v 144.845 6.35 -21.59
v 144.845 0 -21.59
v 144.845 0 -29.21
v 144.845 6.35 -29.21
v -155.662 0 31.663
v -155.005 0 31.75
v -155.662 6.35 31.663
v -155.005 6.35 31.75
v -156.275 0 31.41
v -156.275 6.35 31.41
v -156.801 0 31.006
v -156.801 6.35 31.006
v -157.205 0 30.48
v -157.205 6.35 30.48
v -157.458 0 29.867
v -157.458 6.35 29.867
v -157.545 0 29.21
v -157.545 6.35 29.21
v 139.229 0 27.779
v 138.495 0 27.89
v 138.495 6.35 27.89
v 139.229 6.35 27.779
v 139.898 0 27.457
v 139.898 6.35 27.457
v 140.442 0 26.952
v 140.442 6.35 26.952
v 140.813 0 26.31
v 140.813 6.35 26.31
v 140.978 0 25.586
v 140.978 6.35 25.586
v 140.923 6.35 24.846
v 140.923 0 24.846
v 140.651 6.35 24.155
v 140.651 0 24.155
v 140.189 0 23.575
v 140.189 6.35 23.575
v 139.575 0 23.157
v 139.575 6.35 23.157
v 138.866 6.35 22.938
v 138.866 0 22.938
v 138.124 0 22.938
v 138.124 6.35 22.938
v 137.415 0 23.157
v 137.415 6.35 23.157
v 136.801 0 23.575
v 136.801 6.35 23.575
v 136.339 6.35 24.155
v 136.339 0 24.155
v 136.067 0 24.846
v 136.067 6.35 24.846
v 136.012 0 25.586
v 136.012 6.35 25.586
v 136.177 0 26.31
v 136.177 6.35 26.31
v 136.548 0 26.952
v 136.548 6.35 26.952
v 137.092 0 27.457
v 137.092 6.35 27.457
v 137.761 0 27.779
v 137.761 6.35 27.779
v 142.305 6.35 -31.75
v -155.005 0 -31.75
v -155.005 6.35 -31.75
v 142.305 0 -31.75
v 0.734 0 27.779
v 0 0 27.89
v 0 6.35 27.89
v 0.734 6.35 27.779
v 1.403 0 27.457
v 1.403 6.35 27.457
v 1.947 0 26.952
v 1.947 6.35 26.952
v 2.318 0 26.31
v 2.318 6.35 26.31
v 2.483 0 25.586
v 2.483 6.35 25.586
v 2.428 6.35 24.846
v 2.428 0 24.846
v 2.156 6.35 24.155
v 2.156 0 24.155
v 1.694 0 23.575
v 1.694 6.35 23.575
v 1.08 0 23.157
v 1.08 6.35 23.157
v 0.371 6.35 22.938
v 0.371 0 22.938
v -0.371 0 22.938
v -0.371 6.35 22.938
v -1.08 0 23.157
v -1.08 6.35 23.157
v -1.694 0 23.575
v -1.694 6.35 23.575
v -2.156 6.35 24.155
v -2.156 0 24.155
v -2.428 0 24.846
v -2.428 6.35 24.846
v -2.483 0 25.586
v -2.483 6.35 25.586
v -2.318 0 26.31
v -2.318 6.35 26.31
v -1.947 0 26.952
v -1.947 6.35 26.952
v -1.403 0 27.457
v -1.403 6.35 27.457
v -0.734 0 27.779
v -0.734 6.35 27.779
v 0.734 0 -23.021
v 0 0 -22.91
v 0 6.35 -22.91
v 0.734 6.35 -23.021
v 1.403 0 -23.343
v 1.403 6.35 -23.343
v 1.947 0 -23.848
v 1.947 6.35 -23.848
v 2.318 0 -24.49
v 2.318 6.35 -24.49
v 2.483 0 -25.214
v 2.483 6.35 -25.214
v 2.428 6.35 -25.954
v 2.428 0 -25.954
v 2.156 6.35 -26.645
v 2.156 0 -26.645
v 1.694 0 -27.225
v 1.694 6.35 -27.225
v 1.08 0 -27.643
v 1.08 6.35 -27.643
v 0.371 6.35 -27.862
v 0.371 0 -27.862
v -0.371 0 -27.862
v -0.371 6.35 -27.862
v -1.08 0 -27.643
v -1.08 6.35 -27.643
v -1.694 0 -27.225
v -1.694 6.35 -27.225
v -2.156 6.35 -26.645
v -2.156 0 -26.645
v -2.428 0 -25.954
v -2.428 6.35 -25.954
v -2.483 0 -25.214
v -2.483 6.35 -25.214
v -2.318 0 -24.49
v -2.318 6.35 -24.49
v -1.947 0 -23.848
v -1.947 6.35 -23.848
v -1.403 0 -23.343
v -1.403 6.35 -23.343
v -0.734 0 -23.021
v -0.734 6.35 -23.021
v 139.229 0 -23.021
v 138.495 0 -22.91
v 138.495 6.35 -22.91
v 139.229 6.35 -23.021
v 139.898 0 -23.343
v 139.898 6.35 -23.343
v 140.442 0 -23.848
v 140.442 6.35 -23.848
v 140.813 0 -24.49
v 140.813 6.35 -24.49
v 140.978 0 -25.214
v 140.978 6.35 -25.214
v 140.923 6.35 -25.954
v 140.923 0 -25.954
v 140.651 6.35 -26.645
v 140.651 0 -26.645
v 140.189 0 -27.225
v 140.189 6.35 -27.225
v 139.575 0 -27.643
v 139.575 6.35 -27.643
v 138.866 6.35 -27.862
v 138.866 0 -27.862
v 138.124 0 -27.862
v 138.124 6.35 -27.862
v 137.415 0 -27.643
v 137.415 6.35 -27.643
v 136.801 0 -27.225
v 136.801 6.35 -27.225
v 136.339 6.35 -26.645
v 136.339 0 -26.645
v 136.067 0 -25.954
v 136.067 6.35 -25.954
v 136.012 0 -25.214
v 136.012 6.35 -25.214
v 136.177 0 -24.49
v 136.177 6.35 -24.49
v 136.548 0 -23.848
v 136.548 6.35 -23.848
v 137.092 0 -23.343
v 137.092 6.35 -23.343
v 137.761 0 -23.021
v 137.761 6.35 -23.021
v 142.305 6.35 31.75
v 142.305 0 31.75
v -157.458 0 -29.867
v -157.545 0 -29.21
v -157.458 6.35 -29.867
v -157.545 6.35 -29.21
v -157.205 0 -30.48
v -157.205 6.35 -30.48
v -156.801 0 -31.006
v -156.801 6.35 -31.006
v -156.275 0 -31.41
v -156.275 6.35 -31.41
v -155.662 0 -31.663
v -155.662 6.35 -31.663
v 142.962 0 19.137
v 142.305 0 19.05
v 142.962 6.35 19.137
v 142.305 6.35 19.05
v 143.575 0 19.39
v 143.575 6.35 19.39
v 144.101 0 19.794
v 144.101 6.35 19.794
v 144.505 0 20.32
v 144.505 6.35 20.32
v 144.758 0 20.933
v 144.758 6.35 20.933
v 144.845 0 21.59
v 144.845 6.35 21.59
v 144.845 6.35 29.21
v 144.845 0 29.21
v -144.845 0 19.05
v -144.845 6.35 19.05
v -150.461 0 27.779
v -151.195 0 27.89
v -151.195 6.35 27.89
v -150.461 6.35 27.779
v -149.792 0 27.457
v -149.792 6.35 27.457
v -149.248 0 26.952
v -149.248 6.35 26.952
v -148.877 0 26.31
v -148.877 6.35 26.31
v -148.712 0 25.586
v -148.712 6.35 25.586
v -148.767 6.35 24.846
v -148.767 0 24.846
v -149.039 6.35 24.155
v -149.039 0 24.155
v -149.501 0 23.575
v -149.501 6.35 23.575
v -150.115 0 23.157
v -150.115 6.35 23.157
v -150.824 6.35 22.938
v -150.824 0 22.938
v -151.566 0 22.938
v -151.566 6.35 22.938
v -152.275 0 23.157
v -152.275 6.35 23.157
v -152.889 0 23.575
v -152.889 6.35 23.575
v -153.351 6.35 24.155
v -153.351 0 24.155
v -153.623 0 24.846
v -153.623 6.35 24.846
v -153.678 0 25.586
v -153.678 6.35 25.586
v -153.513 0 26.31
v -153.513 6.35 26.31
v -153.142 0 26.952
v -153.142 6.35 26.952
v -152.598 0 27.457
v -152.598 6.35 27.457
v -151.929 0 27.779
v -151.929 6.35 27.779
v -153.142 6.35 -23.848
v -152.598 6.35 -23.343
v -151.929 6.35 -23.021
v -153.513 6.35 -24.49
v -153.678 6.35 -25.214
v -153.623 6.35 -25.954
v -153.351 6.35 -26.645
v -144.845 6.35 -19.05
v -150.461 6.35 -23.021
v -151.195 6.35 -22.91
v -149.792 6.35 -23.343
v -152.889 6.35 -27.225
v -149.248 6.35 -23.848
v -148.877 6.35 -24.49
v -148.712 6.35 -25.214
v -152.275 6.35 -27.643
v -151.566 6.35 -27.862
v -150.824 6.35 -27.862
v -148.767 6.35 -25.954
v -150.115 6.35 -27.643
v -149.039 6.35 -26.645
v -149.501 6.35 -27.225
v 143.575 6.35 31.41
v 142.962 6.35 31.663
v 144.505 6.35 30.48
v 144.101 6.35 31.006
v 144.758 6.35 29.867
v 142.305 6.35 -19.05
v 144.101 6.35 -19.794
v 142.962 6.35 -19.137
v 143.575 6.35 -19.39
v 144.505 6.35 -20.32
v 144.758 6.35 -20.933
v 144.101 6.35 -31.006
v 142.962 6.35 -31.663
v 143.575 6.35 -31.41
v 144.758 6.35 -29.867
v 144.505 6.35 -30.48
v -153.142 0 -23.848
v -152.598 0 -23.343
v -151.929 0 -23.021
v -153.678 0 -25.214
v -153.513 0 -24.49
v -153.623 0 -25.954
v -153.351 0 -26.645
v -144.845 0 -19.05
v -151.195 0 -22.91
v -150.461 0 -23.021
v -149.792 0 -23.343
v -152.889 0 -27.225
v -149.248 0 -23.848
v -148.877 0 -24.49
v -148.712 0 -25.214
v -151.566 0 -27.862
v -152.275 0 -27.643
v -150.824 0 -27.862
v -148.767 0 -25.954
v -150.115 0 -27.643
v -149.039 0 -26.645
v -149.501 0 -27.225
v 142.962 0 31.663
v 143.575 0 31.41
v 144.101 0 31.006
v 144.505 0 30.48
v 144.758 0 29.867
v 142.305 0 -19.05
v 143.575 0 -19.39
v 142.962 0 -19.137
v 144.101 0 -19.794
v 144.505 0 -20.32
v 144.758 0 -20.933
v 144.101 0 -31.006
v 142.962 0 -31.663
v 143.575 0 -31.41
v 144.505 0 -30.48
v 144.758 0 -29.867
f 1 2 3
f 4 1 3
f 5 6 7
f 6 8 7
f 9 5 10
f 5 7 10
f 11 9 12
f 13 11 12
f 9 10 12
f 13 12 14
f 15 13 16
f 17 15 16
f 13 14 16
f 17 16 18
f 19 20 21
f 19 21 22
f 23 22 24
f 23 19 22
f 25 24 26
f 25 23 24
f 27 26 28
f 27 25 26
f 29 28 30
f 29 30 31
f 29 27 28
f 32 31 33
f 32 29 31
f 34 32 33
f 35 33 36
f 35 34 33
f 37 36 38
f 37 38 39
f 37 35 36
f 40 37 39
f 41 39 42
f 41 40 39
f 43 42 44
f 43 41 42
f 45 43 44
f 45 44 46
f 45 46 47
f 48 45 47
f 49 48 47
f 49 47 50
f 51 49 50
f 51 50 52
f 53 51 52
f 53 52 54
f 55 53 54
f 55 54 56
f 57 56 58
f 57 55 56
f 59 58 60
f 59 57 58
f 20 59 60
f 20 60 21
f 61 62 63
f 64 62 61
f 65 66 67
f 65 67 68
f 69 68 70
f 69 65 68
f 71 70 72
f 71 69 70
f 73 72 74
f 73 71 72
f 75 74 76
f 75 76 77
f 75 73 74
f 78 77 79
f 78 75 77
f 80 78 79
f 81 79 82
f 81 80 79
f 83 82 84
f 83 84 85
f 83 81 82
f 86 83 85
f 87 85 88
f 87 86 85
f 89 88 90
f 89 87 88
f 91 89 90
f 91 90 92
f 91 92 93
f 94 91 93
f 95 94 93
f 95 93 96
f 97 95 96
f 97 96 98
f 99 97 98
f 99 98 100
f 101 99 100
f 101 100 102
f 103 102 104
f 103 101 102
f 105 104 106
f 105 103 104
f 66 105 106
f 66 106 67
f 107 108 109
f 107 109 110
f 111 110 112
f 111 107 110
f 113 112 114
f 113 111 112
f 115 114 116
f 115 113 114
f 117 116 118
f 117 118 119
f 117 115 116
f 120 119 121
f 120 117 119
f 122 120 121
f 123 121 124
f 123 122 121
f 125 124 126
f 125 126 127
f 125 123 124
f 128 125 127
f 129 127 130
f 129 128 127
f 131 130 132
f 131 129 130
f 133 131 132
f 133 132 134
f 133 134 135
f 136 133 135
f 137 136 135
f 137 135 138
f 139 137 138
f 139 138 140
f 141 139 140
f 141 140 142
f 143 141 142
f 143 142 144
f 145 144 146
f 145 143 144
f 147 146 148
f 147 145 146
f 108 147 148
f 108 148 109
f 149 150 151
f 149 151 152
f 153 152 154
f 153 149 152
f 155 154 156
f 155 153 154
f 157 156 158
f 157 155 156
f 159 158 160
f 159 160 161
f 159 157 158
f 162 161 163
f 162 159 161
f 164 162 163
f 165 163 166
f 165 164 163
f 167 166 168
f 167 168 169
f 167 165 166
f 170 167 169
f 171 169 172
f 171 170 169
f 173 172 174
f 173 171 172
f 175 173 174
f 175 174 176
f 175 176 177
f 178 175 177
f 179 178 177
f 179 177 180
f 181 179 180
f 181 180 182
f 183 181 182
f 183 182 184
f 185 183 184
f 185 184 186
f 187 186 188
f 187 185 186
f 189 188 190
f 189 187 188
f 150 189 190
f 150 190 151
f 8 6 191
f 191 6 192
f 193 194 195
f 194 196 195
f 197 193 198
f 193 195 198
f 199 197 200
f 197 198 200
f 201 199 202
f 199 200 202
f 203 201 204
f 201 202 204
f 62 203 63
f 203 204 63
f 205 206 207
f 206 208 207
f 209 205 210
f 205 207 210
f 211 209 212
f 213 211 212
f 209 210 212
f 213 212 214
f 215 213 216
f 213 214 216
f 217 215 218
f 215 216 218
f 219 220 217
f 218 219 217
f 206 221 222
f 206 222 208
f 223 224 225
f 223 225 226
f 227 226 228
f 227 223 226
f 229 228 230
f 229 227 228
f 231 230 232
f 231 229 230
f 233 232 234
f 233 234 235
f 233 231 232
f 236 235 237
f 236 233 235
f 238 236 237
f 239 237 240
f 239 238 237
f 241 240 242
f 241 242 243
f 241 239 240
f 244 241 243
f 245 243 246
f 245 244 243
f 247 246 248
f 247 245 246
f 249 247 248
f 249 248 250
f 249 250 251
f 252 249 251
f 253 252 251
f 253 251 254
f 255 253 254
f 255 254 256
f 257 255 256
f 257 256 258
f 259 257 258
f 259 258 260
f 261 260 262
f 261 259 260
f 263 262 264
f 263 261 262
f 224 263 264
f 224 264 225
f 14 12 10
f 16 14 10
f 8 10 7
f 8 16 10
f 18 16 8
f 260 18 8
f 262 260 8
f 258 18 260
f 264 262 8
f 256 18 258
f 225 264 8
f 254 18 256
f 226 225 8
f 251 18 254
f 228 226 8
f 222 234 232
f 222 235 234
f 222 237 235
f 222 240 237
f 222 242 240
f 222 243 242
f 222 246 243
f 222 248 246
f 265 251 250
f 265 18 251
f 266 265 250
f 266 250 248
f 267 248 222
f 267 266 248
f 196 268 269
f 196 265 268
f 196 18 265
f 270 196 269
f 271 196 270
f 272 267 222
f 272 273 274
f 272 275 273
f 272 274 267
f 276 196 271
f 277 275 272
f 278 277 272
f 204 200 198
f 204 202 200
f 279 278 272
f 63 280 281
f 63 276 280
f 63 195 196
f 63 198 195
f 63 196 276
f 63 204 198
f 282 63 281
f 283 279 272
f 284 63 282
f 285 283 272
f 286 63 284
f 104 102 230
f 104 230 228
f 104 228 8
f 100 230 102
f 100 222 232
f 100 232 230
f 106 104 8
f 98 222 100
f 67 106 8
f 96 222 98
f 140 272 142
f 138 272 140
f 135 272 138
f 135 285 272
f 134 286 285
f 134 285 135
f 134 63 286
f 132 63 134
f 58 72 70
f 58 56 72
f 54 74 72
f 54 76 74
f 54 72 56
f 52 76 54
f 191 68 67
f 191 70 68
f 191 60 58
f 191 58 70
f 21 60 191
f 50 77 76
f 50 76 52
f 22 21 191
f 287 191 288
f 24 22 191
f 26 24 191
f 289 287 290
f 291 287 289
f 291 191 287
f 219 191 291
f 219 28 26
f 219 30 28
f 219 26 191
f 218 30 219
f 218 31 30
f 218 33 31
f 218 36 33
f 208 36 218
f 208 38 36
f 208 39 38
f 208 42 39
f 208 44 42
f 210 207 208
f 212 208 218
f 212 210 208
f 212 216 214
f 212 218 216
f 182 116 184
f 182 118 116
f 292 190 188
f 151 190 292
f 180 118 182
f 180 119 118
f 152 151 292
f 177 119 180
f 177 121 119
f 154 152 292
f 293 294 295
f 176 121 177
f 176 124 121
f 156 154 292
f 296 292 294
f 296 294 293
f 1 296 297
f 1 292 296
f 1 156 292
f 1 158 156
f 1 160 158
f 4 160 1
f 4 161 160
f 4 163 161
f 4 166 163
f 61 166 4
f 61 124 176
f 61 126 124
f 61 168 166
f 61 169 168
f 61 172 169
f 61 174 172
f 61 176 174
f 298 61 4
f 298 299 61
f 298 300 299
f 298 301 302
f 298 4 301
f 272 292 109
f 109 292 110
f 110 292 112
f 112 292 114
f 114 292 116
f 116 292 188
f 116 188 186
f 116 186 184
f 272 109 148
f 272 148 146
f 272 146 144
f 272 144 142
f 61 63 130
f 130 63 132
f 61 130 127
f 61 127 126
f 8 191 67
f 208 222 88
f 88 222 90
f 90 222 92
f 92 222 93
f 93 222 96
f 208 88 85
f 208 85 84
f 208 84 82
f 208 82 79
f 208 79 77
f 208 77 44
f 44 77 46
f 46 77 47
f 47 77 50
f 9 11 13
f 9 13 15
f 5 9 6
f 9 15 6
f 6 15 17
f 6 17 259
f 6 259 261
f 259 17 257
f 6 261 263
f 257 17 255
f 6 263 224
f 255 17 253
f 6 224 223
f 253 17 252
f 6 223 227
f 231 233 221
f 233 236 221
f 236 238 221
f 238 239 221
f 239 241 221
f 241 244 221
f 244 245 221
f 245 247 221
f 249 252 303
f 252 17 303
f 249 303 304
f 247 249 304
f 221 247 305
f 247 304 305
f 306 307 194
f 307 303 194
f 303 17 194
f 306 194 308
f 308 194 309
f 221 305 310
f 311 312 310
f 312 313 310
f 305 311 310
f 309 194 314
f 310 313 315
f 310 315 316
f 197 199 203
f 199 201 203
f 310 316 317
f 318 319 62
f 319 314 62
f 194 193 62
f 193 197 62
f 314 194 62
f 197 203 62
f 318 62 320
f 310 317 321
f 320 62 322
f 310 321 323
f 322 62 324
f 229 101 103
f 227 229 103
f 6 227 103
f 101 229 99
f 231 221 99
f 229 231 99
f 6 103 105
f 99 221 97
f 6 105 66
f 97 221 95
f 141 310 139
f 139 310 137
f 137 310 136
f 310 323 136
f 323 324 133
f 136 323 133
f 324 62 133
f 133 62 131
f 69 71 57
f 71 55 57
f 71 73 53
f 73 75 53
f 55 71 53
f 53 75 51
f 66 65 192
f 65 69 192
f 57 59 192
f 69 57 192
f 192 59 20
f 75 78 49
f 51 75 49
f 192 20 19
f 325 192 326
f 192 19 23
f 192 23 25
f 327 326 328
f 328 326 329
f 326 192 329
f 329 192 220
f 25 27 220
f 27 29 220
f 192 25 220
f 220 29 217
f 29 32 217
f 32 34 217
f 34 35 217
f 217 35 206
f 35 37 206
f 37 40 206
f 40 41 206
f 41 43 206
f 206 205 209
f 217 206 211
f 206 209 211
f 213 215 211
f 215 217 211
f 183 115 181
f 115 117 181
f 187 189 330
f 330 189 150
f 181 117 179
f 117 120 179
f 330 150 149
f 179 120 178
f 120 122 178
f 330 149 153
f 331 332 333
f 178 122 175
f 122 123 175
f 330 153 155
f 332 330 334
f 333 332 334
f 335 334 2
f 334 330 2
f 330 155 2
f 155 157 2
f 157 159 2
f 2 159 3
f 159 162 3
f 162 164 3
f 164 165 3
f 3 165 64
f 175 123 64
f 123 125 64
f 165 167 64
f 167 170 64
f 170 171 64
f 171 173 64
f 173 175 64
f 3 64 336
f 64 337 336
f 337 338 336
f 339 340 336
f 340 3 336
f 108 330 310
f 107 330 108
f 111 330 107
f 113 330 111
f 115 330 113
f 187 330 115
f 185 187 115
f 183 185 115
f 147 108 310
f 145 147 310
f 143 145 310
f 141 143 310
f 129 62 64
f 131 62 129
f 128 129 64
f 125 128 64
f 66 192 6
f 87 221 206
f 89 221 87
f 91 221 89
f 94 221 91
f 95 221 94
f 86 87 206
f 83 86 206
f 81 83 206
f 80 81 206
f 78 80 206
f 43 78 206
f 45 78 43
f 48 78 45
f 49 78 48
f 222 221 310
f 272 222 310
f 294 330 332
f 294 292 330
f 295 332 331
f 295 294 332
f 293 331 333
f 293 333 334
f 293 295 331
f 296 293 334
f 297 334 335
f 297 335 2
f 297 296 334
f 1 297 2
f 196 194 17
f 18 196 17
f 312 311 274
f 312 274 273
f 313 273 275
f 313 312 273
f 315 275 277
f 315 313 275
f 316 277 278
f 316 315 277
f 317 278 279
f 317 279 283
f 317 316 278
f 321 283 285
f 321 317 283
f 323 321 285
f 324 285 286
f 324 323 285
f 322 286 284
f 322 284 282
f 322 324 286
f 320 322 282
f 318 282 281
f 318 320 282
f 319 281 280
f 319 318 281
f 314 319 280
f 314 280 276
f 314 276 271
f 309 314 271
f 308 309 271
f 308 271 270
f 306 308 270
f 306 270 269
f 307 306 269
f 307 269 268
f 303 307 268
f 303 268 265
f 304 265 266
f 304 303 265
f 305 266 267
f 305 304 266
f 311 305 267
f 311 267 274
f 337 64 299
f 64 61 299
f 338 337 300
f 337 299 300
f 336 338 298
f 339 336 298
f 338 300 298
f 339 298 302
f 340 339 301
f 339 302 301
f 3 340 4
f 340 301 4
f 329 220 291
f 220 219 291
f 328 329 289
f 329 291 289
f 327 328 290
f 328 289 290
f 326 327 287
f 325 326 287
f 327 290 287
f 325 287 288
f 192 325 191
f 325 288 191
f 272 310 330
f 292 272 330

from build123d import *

# Parameters (mm, degrees)
SKETCH1_W           = 289.69
SKETCH1_H           = 12.7
SKETCH1_R           = 2.49
BOSS_EXTRUDE1_DEPTH = 6.35
FILLET1_R           = 2.54


with BuildPart() as part:
    # Sketch1 → Boss-Extrude1 (new body)
    # profile 1 of 3: a face of its own
    with BuildSketch(Plane(origin=(0, 0, 0), x_dir=(1, 0, 0), z_dir=(0, 1, 0))):
        with Locations((0, -25.4)):
            Rectangle(SKETCH1_W, SKETCH1_H)
        with Locations(Location((138.495, -25.4, 0), (0, 0, 270))):
            Circle(SKETCH1_R, mode=Mode.SUBTRACT)
        with Locations(Location((0, -25.4, 0), (0, 0, 270))):
            Circle(SKETCH1_R, mode=Mode.SUBTRACT)
    # profile 2 of 3: a face of its own
    with BuildSketch(Plane(origin=(0, 0, 0), x_dir=(1, 0, 0), z_dir=(0, 1, 0))):
        Polygon((-144.845, 31.75), (-157.545, 31.75), (-157.545, -31.75), (-144.845, -31.75), (-144.845, -19.05), (-144.845, 19.05), align=None)
        with Locations(Location((-151.195, -25.4, 0), (0, 0, 270))):
            Circle(SKETCH1_R, mode=Mode.SUBTRACT)
        with Locations(Location((-151.195, 25.4, 0), (0, 0, 270))):
            Circle(SKETCH1_R, mode=Mode.SUBTRACT)
    # profile 3 of 3: a face of its own
    with BuildSketch(Plane(origin=(0, 0, 0), x_dir=(1, 0, 0), z_dir=(0, 1, 0))):
        with Locations((0, 25.4)):
            Rectangle(SKETCH1_W, SKETCH1_H)
        with Locations(Location((138.495, 25.4, 0), (0, 0, 270))):
            Circle(SKETCH1_R, mode=Mode.SUBTRACT)
        with Locations(Location((0, 25.4, 0), (0, 0, 270))):
            Circle(SKETCH1_R, mode=Mode.SUBTRACT)
    extrude(amount=BOSS_EXTRUDE1_DEPTH)

    # Fillet1
    fillet1_edges = [part.edges().sort_by_distance(p)[0] for p in [
        (144.845, 3.175, 19.05),
        (144.845, 3.175, 31.75),
        (-157.545, 3.175, 31.75),
        (-157.545, 3.175, -31.75),
        (144.845, 3.175, -31.75),
        (144.845, 3.175, -19.05),
    ]]
    fillet(fillet1_edges, radius=FILLET1_R)


solid = part.part
